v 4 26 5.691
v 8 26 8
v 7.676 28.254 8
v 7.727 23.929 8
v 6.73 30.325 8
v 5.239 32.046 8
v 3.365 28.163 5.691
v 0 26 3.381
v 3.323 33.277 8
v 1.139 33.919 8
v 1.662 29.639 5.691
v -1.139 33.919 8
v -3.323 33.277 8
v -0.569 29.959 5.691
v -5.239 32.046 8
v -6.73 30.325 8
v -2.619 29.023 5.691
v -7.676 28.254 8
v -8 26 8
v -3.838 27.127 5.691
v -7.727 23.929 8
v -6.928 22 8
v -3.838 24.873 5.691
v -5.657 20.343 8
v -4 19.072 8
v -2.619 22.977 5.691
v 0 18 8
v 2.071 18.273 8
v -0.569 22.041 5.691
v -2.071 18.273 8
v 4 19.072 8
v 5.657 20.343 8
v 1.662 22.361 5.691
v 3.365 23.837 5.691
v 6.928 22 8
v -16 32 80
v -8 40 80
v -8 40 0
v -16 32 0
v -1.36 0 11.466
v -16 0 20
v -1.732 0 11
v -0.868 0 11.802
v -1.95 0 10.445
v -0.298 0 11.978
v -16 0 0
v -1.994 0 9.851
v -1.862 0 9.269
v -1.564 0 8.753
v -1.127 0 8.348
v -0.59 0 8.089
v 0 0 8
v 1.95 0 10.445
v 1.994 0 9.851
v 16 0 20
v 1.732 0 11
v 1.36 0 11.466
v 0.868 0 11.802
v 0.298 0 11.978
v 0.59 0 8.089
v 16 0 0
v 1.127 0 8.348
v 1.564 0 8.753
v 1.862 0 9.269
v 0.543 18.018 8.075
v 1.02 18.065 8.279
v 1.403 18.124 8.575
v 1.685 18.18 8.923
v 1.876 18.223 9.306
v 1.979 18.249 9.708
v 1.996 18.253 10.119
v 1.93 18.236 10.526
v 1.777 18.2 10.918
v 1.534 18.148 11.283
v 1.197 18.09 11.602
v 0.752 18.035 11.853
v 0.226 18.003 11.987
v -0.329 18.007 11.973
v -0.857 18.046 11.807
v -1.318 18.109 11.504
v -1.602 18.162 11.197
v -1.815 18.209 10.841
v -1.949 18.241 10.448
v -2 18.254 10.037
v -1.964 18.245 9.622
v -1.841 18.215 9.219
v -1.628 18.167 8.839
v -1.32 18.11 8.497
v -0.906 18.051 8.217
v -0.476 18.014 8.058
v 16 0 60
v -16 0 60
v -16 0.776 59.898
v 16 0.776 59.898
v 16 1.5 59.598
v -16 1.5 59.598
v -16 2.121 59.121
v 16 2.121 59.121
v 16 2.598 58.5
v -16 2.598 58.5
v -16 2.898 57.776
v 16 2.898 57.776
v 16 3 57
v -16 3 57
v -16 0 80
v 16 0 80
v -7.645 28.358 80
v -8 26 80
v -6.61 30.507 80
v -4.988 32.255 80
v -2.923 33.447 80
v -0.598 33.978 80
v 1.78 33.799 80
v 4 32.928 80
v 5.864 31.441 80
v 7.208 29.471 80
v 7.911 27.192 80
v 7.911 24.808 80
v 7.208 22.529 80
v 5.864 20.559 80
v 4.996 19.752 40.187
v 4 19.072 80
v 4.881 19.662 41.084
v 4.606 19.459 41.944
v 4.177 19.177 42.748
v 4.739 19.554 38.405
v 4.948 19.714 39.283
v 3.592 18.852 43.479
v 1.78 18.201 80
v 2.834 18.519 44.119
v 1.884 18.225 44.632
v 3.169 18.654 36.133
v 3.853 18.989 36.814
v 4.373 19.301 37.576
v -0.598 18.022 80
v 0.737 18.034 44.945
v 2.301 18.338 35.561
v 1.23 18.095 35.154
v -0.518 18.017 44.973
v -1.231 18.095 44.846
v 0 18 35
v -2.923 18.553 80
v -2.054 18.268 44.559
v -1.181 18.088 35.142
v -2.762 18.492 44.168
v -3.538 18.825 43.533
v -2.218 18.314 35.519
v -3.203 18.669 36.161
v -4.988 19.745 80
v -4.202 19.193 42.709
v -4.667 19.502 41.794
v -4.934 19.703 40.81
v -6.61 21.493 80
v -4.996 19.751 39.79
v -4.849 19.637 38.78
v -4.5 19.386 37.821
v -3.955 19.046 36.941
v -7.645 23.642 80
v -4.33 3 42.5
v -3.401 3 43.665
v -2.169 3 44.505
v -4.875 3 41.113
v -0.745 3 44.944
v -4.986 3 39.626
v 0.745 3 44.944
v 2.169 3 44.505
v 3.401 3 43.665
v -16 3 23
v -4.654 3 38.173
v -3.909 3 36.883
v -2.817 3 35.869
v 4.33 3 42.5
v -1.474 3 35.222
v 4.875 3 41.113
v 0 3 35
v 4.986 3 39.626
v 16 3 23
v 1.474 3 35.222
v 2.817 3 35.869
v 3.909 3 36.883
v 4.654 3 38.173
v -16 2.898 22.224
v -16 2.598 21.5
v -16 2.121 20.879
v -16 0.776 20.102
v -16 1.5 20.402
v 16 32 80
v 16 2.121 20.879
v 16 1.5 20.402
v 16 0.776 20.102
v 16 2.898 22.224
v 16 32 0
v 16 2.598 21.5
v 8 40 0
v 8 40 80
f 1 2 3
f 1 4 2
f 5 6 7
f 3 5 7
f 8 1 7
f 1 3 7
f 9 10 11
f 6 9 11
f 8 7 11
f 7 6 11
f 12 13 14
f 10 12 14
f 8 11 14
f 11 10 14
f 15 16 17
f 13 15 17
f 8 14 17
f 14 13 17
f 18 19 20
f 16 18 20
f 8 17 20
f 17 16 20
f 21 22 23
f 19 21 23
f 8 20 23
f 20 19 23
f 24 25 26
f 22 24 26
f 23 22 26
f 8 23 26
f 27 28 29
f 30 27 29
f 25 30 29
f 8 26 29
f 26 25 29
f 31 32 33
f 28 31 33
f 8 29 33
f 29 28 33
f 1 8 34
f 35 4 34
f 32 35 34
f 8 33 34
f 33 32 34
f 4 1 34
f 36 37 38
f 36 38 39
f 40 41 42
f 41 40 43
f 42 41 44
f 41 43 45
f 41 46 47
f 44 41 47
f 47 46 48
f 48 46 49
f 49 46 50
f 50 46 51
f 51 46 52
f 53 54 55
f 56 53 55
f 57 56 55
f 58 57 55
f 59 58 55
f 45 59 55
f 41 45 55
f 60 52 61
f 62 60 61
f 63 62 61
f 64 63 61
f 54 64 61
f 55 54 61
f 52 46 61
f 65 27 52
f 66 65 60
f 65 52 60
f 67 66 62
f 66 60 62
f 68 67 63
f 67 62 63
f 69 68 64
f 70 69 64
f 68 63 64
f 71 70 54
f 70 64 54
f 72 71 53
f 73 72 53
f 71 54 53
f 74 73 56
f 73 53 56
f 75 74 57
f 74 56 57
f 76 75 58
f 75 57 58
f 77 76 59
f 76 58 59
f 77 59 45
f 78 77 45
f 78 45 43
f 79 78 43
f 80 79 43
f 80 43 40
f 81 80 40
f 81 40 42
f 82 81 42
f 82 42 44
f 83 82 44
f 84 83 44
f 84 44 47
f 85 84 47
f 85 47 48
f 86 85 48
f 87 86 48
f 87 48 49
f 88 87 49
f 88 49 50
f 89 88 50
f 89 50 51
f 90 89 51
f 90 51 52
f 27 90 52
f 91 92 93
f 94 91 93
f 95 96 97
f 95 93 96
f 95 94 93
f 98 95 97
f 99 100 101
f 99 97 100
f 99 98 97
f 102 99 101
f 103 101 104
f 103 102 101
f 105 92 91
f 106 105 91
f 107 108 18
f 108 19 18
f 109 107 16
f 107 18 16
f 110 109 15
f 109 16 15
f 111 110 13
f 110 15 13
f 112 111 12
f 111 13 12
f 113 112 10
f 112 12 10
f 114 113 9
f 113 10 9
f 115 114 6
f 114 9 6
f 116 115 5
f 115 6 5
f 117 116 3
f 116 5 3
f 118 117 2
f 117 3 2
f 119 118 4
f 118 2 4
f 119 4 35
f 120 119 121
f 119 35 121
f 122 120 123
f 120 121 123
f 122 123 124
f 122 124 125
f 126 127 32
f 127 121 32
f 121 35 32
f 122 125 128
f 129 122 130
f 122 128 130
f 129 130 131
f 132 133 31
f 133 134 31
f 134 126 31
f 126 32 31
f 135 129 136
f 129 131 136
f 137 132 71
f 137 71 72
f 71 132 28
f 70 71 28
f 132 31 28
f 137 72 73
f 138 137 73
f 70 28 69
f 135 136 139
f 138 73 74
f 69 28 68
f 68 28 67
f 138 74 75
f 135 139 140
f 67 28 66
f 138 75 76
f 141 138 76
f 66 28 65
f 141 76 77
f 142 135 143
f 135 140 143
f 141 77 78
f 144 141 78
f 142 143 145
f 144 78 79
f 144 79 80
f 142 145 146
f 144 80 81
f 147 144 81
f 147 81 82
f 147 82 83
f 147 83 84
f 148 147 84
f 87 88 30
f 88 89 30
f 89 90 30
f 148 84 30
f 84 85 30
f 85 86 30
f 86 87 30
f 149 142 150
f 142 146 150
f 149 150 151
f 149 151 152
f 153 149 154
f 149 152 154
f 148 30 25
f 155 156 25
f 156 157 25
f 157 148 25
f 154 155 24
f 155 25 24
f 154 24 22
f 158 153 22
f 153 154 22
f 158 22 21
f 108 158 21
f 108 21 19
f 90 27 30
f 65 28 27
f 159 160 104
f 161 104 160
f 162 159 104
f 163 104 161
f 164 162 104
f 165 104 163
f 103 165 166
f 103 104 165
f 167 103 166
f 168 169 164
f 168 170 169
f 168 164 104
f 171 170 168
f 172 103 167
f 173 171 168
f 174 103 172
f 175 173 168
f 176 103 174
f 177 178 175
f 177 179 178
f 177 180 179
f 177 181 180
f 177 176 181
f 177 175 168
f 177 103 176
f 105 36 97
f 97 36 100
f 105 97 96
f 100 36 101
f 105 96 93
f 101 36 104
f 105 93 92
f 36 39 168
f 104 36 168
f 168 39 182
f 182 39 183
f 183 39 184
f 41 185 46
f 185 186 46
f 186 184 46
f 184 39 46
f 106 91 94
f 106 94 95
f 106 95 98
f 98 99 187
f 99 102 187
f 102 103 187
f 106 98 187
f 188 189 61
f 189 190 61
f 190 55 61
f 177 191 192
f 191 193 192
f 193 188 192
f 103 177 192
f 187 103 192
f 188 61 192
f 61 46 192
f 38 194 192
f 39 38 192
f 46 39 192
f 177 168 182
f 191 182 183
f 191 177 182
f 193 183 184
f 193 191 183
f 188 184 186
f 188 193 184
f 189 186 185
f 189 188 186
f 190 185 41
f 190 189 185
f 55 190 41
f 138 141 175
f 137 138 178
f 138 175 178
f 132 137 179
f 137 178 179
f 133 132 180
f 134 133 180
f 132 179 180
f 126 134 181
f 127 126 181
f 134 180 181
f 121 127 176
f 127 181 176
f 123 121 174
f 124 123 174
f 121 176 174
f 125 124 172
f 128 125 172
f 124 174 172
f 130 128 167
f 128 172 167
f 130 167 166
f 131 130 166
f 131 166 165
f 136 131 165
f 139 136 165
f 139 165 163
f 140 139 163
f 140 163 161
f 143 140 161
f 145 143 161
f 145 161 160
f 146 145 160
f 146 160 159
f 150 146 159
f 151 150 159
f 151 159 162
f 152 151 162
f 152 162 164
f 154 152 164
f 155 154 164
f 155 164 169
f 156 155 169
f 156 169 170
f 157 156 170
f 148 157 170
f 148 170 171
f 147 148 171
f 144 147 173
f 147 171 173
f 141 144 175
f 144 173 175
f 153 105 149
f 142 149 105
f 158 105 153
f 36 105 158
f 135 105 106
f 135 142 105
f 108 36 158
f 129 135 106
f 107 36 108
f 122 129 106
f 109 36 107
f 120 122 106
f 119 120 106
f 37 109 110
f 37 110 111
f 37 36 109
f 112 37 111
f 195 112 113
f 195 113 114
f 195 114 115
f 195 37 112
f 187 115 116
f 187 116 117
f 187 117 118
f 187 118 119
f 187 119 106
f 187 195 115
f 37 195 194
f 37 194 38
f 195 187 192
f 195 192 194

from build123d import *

# Parameters (mm, degrees)
BOSS_EXTRU_1_DEPTH           = 80
ENL_V_MAT_EXTRU_1_DEPTH      = 95.994736696
D_GAGEMENT_M11_D             = 16
D_GAGEMENT_M11_DEPTH         = 72
D_GAGEMENT_M11_TIP           = 4.618802154
ENL_V_MAT_EXTRU_2_REACH      = 91.582
ENL_V_MAT_EXTRU_2_END_RADIUS = 8
ESQUISSE3_R                  = 5
ENL_V_MAT_EXTRU_3_REACH      = 92.863
ENL_V_MAT_EXTRU_3_END_RADIUS = 8
ESQUISSE7_R                  = 2


with BuildPart() as part:
    # Esquisse1 → Boss.-Extru.1 (new body)
    with BuildSketch(Plane.XY):
        Polygon((-16, 0), (16, 0), (16, 32), (8, 40), (-8, 40), (-16, 32), align=None)
    extrude(amount=BOSS_EXTRU_1_DEPTH)

    # Esquisse2 → Enlèv. mat.-Extru.1 (cut, through all)
    with BuildSketch(Plane(origin=(16, 0, 0), x_dir=(0, 0, -1), z_dir=(1, 0, 0))):
        with BuildLine():
            Line((-60, -3), (-60, 0))
            ThreePointArc((-60, 0), (-59.121320344, 2.121320344), (-57, 3))
            Line((-57, 3), (-23, 3))
            ThreePointArc((-23, 3), (-20.878679656, 2.121320344), (-20, 0))
            Line((-20, 0), (-20, -3))
            Line((-20, -3), (-60, -3))
        make_face()
    extrude(amount=-ENL_V_MAT_EXTRU_1_DEPTH, mode=Mode.SUBTRACT)

    # Dégagement M11
    with Locations(Plane.XY.offset(80)):
        with Locations((0, 26)):
            Hole(D_GAGEMENT_M11_D / 2, depth=D_GAGEMENT_M11_DEPTH)
            with Locations((0, 0, -(D_GAGEMENT_M11_DEPTH + D_GAGEMENT_M11_TIP / 2))):  # 120° drill point
                Cone(0, D_GAGEMENT_M11_D / 2, D_GAGEMENT_M11_TIP, mode=Mode.SUBTRACT)

    # Enlèv. mat.-Extru.2: up to this cylinder (the profile starts outside it)
    enl_v_mat_extru_2_end = Plane(origin=(0, 26, 40), z_dir=(0, 0, 1)) * Cylinder(ENL_V_MAT_EXTRU_2_END_RADIUS, 200.164, mode=Mode.PRIVATE)
    # Esquisse3 → Enlèv. mat.-Extru.2 (cut, up to the surface)
    with BuildSketch(Plane.XZ.offset(-3), mode=Mode.PRIVATE) as enl_v_mat_extru_2_sk1:
        with Locations(Location((0, 40, 0), (0, 0, 270))):
            Circle(ESQUISSE3_R)
    enl_v_mat_extru_2_tool1 = extrude(enl_v_mat_extru_2_sk1.sketch, amount=-ENL_V_MAT_EXTRU_2_REACH, mode=Mode.PRIVATE) - enl_v_mat_extru_2_end
    add(enl_v_mat_extru_2_tool1.solids().sort_by_distance((0, 3, 40))[0], mode=Mode.SUBTRACT)

    # Enlèv. mat.-Extru.3: up to this cylinder (the profile starts outside it)
    enl_v_mat_extru_3_end = Plane(origin=(0, 26, 10), z_dir=(0, 0, 1)) * Cylinder(ENL_V_MAT_EXTRU_3_END_RADIUS, 202.726, mode=Mode.PRIVATE)
    # Esquisse7 → Enlèv. mat.-Extru.3 (cut, up to the surface)
    with BuildSketch(Plane.XZ, mode=Mode.PRIVATE) as enl_v_mat_extru_3_sk1:
        with Locations(Location((0, 10, 0), (0, 0, 270))):
            Circle(ESQUISSE7_R)
    enl_v_mat_extru_3_tool1 = extrude(enl_v_mat_extru_3_sk1.sketch, amount=-ENL_V_MAT_EXTRU_3_REACH, mode=Mode.PRIVATE) - enl_v_mat_extru_3_end
    add(enl_v_mat_extru_3_tool1.solids().sort_by_distance((0, 0, 10))[0], mode=Mode.SUBTRACT)


solid = part.part
